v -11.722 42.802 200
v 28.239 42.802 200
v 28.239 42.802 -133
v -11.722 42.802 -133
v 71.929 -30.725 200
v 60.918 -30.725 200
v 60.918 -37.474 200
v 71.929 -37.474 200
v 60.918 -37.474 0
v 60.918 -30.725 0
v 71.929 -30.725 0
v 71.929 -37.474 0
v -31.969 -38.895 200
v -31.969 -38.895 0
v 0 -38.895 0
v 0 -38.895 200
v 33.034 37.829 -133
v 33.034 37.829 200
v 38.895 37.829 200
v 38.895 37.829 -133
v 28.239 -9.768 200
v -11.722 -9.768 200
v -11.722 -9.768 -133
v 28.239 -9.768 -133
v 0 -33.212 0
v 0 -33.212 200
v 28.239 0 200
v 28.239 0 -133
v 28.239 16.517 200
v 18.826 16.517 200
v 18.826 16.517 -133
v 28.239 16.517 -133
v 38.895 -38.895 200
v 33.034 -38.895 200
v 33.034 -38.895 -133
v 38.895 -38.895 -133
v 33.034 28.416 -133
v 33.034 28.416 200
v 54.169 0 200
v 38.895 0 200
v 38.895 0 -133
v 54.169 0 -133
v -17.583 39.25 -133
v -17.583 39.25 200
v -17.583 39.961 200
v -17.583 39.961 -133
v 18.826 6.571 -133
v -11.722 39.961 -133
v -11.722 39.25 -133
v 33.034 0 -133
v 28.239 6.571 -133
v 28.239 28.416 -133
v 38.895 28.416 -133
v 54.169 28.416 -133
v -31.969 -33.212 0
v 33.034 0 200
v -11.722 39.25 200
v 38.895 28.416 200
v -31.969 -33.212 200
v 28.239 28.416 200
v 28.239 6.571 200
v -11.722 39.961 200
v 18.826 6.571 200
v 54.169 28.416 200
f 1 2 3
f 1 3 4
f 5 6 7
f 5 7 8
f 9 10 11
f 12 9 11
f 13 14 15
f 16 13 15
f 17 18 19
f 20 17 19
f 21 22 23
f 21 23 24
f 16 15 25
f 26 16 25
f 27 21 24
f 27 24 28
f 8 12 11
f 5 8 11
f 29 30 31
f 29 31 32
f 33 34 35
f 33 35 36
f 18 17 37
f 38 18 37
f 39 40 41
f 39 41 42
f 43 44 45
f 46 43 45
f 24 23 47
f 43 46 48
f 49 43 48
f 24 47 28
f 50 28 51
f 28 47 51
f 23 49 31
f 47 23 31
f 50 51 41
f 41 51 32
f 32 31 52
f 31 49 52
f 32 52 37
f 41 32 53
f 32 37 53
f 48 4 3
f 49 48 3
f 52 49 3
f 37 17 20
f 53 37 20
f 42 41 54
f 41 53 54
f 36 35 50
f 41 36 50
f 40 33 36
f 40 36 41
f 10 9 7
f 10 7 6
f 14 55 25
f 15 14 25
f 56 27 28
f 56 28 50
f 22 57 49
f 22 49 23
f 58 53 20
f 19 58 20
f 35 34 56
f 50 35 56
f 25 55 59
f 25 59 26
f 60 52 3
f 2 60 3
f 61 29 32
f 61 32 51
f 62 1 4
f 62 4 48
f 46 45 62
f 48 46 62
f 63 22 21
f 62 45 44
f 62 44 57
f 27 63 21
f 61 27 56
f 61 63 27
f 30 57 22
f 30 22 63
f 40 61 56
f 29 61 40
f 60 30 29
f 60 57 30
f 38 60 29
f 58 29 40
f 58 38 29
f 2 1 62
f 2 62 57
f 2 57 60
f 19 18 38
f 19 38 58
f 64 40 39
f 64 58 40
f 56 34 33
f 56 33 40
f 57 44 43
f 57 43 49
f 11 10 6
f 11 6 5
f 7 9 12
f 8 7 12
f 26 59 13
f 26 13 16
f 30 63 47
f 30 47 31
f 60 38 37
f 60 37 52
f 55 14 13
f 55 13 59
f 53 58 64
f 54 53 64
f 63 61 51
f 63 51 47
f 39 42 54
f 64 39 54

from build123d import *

# Parameters (mm, degrees)
F0_W     = 5.8608949184
F0_H     = 9.4129443169
F0_H_2   = 28.416454792
F0_W_2   = 15.2738541365
F0_H_3   = 38.8950258493
F0_H_4   = 0.7104128599
F0_W_3   = 1.7760246992
F1_DEPTH = 200
F0_W_4   = 31.9685041904
F0_H_5   = 5.6832879782
F0_W_5   = 11.011376977
F0_H_6   = 6.7489147186
F2_DEPTH = 333


with BuildPart() as f1:
    # F0 (on Top) → F1 (new body)
    with BuildSketch(Plane.XY):
        Polygon((28.2388776541, 16.5170654655), (28.2388776541, 28.416454792), (13.6754363775, 28.416454792), (13.6754363775, 0), (28.2388776541, 0), (28.2388776541, 6.5713077784), (18.8259184361, 6.5713077784), (18.8259184361, 16.5170654655), align=None)
        with Locations((35.9645932913, 33.1229269505)):
            Rectangle(F0_W, F0_H)
        with Locations((35.9645932913, 14.208227396)):
            Rectangle(F0_W, F0_H_2)
        Polygon((33.0341458321, 0), (33.0341458321, 28.416454792), (28.2388776541, 28.416454792), (28.2388776541, 16.5170654655), (28.2388776541, 6.5713077784), (28.2388776541, 0), align=None)
        with Locations((46.5319678187, 14.208227396)):
            Rectangle(F0_W_2, F0_H_2)
        with Locations((35.9645932913, -19.4475129247)):
            Rectangle(F0_W, F0_H_3)
        Polygon((13.6754363775, 28.416454792), (28.2388776541, 28.416454792), (28.2388776541, 42.8022891283), (-11.7217749357, 42.8022891283), (-11.7217749357, 39.9606376886), (-9.9457502365, 39.9606376886), (-9.9457502365, 39.2502248287), (-11.7217749357, 39.2502248287), (-11.7217749357, -9.7681581974), (28.2388776541, -9.7681581974), (28.2388776541, 0), (13.6754363775, 0), align=None)
        with Locations((-14.6522223949, 39.6054312587)):
            Rectangle(F0_W, F0_H_4)
        with Locations((-10.8337625861, 39.6054312587)):
            Rectangle(F0_W_3, F0_H_4)
    extrude(amount=F1_DEPTH)

    # F2 (add): a face of the model
    f2_faces = [f1.faces().sort_by_distance(p)[0] for p in [
        (18.3515295696, 13.7387134094, 200),
    ]]
    extrude(f2_faces, amount=-F2_DEPTH)


with BuildPart() as f1b:
    # F0 (on Top) → F1, piece 2 (new body)
    with BuildSketch(Plane.XY):
        with Locations((-15.9842520952, -36.0533818603)):
            Rectangle(F0_W_4, F0_H_5)
    extrude(amount=F1_DEPTH)


with BuildPart() as f1c:
    # F0 (on Top) → F1, piece 3 (new body)
    with BuildSketch(Plane.XY):
        with Locations((66.4234831929, -34.0997576714)):
            Rectangle(F0_W_5, F0_H_6)
    extrude(amount=F1_DEPTH)


solid = Compound([f1.part, f1b.part, f1c.part])
